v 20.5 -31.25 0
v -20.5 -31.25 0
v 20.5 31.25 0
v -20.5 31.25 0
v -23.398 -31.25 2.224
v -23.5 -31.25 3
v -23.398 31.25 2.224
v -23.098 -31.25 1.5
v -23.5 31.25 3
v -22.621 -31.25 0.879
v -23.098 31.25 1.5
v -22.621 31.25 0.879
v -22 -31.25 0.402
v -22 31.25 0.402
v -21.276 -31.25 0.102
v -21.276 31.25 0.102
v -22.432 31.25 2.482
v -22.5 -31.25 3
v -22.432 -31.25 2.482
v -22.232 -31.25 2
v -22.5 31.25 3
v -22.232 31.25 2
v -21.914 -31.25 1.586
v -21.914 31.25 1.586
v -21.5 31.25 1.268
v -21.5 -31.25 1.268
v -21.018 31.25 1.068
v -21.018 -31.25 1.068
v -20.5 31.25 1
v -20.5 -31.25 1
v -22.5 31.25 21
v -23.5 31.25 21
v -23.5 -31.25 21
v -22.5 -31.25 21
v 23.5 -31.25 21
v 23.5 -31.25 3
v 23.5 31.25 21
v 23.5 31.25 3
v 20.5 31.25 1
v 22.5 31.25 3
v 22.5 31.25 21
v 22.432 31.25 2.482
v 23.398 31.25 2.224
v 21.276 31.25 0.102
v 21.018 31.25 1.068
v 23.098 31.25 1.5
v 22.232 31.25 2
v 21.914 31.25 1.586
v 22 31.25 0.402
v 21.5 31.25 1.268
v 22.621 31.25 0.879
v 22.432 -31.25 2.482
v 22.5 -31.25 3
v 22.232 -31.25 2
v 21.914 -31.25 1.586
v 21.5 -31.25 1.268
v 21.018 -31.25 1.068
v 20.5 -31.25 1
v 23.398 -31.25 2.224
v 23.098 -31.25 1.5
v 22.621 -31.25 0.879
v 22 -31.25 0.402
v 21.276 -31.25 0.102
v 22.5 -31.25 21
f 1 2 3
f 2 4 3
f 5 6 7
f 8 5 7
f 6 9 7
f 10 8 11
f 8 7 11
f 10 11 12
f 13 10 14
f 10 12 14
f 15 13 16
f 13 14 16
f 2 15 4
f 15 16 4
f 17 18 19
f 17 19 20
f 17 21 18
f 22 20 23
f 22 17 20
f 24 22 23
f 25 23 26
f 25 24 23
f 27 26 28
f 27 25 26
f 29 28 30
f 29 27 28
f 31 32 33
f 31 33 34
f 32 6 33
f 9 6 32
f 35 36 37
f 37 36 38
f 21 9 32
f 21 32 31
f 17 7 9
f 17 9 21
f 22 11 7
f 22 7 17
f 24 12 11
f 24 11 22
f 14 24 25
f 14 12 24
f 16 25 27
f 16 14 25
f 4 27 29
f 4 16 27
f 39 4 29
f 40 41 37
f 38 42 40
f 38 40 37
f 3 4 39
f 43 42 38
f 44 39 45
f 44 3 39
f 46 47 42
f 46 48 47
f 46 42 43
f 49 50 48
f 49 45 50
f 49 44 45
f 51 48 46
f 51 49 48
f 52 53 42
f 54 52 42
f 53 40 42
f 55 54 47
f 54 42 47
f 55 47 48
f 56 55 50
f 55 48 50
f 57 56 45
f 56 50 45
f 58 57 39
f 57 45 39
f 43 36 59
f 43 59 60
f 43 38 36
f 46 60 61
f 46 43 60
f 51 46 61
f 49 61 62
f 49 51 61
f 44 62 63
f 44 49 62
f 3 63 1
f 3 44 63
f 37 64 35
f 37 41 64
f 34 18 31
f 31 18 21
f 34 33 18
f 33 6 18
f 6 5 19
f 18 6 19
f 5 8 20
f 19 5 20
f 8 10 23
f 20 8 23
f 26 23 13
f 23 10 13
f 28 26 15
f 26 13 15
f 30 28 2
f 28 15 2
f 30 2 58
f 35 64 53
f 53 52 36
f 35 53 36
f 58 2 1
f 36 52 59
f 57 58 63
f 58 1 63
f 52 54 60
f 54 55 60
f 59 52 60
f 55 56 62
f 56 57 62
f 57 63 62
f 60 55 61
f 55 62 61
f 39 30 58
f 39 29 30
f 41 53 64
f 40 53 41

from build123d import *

# Parameters (mm, degrees)
F0_W     = 47
F0_H     = 62.5
F1_DEPTH = 21
F2_R     = 3
F3_T     = -1


with BuildPart() as f1:
    # F0 (on Top) → F1 (new body)
    with BuildSketch(Plane.XY):
        Rectangle(F0_W, F0_H)
    extrude(amount=F1_DEPTH)

    # F2
    f2_edges = [f1.edges().sort_by_distance(p)[0] for p in [
        (23.5, 0, 0),
        (-23.5, 0, 0),
    ]]
    fillet(f2_edges, radius=F2_R)

    # F3
    f3_openings = [f1.faces().sort_by_distance(p)[0] for p in [
        (0, 0, 21),
        (0, -31.25, 10.538623),
        (0, 31.25, 10.538623),
    ]]
    offset(amount=F3_T, openings=f3_openings)


solid = f1.part
